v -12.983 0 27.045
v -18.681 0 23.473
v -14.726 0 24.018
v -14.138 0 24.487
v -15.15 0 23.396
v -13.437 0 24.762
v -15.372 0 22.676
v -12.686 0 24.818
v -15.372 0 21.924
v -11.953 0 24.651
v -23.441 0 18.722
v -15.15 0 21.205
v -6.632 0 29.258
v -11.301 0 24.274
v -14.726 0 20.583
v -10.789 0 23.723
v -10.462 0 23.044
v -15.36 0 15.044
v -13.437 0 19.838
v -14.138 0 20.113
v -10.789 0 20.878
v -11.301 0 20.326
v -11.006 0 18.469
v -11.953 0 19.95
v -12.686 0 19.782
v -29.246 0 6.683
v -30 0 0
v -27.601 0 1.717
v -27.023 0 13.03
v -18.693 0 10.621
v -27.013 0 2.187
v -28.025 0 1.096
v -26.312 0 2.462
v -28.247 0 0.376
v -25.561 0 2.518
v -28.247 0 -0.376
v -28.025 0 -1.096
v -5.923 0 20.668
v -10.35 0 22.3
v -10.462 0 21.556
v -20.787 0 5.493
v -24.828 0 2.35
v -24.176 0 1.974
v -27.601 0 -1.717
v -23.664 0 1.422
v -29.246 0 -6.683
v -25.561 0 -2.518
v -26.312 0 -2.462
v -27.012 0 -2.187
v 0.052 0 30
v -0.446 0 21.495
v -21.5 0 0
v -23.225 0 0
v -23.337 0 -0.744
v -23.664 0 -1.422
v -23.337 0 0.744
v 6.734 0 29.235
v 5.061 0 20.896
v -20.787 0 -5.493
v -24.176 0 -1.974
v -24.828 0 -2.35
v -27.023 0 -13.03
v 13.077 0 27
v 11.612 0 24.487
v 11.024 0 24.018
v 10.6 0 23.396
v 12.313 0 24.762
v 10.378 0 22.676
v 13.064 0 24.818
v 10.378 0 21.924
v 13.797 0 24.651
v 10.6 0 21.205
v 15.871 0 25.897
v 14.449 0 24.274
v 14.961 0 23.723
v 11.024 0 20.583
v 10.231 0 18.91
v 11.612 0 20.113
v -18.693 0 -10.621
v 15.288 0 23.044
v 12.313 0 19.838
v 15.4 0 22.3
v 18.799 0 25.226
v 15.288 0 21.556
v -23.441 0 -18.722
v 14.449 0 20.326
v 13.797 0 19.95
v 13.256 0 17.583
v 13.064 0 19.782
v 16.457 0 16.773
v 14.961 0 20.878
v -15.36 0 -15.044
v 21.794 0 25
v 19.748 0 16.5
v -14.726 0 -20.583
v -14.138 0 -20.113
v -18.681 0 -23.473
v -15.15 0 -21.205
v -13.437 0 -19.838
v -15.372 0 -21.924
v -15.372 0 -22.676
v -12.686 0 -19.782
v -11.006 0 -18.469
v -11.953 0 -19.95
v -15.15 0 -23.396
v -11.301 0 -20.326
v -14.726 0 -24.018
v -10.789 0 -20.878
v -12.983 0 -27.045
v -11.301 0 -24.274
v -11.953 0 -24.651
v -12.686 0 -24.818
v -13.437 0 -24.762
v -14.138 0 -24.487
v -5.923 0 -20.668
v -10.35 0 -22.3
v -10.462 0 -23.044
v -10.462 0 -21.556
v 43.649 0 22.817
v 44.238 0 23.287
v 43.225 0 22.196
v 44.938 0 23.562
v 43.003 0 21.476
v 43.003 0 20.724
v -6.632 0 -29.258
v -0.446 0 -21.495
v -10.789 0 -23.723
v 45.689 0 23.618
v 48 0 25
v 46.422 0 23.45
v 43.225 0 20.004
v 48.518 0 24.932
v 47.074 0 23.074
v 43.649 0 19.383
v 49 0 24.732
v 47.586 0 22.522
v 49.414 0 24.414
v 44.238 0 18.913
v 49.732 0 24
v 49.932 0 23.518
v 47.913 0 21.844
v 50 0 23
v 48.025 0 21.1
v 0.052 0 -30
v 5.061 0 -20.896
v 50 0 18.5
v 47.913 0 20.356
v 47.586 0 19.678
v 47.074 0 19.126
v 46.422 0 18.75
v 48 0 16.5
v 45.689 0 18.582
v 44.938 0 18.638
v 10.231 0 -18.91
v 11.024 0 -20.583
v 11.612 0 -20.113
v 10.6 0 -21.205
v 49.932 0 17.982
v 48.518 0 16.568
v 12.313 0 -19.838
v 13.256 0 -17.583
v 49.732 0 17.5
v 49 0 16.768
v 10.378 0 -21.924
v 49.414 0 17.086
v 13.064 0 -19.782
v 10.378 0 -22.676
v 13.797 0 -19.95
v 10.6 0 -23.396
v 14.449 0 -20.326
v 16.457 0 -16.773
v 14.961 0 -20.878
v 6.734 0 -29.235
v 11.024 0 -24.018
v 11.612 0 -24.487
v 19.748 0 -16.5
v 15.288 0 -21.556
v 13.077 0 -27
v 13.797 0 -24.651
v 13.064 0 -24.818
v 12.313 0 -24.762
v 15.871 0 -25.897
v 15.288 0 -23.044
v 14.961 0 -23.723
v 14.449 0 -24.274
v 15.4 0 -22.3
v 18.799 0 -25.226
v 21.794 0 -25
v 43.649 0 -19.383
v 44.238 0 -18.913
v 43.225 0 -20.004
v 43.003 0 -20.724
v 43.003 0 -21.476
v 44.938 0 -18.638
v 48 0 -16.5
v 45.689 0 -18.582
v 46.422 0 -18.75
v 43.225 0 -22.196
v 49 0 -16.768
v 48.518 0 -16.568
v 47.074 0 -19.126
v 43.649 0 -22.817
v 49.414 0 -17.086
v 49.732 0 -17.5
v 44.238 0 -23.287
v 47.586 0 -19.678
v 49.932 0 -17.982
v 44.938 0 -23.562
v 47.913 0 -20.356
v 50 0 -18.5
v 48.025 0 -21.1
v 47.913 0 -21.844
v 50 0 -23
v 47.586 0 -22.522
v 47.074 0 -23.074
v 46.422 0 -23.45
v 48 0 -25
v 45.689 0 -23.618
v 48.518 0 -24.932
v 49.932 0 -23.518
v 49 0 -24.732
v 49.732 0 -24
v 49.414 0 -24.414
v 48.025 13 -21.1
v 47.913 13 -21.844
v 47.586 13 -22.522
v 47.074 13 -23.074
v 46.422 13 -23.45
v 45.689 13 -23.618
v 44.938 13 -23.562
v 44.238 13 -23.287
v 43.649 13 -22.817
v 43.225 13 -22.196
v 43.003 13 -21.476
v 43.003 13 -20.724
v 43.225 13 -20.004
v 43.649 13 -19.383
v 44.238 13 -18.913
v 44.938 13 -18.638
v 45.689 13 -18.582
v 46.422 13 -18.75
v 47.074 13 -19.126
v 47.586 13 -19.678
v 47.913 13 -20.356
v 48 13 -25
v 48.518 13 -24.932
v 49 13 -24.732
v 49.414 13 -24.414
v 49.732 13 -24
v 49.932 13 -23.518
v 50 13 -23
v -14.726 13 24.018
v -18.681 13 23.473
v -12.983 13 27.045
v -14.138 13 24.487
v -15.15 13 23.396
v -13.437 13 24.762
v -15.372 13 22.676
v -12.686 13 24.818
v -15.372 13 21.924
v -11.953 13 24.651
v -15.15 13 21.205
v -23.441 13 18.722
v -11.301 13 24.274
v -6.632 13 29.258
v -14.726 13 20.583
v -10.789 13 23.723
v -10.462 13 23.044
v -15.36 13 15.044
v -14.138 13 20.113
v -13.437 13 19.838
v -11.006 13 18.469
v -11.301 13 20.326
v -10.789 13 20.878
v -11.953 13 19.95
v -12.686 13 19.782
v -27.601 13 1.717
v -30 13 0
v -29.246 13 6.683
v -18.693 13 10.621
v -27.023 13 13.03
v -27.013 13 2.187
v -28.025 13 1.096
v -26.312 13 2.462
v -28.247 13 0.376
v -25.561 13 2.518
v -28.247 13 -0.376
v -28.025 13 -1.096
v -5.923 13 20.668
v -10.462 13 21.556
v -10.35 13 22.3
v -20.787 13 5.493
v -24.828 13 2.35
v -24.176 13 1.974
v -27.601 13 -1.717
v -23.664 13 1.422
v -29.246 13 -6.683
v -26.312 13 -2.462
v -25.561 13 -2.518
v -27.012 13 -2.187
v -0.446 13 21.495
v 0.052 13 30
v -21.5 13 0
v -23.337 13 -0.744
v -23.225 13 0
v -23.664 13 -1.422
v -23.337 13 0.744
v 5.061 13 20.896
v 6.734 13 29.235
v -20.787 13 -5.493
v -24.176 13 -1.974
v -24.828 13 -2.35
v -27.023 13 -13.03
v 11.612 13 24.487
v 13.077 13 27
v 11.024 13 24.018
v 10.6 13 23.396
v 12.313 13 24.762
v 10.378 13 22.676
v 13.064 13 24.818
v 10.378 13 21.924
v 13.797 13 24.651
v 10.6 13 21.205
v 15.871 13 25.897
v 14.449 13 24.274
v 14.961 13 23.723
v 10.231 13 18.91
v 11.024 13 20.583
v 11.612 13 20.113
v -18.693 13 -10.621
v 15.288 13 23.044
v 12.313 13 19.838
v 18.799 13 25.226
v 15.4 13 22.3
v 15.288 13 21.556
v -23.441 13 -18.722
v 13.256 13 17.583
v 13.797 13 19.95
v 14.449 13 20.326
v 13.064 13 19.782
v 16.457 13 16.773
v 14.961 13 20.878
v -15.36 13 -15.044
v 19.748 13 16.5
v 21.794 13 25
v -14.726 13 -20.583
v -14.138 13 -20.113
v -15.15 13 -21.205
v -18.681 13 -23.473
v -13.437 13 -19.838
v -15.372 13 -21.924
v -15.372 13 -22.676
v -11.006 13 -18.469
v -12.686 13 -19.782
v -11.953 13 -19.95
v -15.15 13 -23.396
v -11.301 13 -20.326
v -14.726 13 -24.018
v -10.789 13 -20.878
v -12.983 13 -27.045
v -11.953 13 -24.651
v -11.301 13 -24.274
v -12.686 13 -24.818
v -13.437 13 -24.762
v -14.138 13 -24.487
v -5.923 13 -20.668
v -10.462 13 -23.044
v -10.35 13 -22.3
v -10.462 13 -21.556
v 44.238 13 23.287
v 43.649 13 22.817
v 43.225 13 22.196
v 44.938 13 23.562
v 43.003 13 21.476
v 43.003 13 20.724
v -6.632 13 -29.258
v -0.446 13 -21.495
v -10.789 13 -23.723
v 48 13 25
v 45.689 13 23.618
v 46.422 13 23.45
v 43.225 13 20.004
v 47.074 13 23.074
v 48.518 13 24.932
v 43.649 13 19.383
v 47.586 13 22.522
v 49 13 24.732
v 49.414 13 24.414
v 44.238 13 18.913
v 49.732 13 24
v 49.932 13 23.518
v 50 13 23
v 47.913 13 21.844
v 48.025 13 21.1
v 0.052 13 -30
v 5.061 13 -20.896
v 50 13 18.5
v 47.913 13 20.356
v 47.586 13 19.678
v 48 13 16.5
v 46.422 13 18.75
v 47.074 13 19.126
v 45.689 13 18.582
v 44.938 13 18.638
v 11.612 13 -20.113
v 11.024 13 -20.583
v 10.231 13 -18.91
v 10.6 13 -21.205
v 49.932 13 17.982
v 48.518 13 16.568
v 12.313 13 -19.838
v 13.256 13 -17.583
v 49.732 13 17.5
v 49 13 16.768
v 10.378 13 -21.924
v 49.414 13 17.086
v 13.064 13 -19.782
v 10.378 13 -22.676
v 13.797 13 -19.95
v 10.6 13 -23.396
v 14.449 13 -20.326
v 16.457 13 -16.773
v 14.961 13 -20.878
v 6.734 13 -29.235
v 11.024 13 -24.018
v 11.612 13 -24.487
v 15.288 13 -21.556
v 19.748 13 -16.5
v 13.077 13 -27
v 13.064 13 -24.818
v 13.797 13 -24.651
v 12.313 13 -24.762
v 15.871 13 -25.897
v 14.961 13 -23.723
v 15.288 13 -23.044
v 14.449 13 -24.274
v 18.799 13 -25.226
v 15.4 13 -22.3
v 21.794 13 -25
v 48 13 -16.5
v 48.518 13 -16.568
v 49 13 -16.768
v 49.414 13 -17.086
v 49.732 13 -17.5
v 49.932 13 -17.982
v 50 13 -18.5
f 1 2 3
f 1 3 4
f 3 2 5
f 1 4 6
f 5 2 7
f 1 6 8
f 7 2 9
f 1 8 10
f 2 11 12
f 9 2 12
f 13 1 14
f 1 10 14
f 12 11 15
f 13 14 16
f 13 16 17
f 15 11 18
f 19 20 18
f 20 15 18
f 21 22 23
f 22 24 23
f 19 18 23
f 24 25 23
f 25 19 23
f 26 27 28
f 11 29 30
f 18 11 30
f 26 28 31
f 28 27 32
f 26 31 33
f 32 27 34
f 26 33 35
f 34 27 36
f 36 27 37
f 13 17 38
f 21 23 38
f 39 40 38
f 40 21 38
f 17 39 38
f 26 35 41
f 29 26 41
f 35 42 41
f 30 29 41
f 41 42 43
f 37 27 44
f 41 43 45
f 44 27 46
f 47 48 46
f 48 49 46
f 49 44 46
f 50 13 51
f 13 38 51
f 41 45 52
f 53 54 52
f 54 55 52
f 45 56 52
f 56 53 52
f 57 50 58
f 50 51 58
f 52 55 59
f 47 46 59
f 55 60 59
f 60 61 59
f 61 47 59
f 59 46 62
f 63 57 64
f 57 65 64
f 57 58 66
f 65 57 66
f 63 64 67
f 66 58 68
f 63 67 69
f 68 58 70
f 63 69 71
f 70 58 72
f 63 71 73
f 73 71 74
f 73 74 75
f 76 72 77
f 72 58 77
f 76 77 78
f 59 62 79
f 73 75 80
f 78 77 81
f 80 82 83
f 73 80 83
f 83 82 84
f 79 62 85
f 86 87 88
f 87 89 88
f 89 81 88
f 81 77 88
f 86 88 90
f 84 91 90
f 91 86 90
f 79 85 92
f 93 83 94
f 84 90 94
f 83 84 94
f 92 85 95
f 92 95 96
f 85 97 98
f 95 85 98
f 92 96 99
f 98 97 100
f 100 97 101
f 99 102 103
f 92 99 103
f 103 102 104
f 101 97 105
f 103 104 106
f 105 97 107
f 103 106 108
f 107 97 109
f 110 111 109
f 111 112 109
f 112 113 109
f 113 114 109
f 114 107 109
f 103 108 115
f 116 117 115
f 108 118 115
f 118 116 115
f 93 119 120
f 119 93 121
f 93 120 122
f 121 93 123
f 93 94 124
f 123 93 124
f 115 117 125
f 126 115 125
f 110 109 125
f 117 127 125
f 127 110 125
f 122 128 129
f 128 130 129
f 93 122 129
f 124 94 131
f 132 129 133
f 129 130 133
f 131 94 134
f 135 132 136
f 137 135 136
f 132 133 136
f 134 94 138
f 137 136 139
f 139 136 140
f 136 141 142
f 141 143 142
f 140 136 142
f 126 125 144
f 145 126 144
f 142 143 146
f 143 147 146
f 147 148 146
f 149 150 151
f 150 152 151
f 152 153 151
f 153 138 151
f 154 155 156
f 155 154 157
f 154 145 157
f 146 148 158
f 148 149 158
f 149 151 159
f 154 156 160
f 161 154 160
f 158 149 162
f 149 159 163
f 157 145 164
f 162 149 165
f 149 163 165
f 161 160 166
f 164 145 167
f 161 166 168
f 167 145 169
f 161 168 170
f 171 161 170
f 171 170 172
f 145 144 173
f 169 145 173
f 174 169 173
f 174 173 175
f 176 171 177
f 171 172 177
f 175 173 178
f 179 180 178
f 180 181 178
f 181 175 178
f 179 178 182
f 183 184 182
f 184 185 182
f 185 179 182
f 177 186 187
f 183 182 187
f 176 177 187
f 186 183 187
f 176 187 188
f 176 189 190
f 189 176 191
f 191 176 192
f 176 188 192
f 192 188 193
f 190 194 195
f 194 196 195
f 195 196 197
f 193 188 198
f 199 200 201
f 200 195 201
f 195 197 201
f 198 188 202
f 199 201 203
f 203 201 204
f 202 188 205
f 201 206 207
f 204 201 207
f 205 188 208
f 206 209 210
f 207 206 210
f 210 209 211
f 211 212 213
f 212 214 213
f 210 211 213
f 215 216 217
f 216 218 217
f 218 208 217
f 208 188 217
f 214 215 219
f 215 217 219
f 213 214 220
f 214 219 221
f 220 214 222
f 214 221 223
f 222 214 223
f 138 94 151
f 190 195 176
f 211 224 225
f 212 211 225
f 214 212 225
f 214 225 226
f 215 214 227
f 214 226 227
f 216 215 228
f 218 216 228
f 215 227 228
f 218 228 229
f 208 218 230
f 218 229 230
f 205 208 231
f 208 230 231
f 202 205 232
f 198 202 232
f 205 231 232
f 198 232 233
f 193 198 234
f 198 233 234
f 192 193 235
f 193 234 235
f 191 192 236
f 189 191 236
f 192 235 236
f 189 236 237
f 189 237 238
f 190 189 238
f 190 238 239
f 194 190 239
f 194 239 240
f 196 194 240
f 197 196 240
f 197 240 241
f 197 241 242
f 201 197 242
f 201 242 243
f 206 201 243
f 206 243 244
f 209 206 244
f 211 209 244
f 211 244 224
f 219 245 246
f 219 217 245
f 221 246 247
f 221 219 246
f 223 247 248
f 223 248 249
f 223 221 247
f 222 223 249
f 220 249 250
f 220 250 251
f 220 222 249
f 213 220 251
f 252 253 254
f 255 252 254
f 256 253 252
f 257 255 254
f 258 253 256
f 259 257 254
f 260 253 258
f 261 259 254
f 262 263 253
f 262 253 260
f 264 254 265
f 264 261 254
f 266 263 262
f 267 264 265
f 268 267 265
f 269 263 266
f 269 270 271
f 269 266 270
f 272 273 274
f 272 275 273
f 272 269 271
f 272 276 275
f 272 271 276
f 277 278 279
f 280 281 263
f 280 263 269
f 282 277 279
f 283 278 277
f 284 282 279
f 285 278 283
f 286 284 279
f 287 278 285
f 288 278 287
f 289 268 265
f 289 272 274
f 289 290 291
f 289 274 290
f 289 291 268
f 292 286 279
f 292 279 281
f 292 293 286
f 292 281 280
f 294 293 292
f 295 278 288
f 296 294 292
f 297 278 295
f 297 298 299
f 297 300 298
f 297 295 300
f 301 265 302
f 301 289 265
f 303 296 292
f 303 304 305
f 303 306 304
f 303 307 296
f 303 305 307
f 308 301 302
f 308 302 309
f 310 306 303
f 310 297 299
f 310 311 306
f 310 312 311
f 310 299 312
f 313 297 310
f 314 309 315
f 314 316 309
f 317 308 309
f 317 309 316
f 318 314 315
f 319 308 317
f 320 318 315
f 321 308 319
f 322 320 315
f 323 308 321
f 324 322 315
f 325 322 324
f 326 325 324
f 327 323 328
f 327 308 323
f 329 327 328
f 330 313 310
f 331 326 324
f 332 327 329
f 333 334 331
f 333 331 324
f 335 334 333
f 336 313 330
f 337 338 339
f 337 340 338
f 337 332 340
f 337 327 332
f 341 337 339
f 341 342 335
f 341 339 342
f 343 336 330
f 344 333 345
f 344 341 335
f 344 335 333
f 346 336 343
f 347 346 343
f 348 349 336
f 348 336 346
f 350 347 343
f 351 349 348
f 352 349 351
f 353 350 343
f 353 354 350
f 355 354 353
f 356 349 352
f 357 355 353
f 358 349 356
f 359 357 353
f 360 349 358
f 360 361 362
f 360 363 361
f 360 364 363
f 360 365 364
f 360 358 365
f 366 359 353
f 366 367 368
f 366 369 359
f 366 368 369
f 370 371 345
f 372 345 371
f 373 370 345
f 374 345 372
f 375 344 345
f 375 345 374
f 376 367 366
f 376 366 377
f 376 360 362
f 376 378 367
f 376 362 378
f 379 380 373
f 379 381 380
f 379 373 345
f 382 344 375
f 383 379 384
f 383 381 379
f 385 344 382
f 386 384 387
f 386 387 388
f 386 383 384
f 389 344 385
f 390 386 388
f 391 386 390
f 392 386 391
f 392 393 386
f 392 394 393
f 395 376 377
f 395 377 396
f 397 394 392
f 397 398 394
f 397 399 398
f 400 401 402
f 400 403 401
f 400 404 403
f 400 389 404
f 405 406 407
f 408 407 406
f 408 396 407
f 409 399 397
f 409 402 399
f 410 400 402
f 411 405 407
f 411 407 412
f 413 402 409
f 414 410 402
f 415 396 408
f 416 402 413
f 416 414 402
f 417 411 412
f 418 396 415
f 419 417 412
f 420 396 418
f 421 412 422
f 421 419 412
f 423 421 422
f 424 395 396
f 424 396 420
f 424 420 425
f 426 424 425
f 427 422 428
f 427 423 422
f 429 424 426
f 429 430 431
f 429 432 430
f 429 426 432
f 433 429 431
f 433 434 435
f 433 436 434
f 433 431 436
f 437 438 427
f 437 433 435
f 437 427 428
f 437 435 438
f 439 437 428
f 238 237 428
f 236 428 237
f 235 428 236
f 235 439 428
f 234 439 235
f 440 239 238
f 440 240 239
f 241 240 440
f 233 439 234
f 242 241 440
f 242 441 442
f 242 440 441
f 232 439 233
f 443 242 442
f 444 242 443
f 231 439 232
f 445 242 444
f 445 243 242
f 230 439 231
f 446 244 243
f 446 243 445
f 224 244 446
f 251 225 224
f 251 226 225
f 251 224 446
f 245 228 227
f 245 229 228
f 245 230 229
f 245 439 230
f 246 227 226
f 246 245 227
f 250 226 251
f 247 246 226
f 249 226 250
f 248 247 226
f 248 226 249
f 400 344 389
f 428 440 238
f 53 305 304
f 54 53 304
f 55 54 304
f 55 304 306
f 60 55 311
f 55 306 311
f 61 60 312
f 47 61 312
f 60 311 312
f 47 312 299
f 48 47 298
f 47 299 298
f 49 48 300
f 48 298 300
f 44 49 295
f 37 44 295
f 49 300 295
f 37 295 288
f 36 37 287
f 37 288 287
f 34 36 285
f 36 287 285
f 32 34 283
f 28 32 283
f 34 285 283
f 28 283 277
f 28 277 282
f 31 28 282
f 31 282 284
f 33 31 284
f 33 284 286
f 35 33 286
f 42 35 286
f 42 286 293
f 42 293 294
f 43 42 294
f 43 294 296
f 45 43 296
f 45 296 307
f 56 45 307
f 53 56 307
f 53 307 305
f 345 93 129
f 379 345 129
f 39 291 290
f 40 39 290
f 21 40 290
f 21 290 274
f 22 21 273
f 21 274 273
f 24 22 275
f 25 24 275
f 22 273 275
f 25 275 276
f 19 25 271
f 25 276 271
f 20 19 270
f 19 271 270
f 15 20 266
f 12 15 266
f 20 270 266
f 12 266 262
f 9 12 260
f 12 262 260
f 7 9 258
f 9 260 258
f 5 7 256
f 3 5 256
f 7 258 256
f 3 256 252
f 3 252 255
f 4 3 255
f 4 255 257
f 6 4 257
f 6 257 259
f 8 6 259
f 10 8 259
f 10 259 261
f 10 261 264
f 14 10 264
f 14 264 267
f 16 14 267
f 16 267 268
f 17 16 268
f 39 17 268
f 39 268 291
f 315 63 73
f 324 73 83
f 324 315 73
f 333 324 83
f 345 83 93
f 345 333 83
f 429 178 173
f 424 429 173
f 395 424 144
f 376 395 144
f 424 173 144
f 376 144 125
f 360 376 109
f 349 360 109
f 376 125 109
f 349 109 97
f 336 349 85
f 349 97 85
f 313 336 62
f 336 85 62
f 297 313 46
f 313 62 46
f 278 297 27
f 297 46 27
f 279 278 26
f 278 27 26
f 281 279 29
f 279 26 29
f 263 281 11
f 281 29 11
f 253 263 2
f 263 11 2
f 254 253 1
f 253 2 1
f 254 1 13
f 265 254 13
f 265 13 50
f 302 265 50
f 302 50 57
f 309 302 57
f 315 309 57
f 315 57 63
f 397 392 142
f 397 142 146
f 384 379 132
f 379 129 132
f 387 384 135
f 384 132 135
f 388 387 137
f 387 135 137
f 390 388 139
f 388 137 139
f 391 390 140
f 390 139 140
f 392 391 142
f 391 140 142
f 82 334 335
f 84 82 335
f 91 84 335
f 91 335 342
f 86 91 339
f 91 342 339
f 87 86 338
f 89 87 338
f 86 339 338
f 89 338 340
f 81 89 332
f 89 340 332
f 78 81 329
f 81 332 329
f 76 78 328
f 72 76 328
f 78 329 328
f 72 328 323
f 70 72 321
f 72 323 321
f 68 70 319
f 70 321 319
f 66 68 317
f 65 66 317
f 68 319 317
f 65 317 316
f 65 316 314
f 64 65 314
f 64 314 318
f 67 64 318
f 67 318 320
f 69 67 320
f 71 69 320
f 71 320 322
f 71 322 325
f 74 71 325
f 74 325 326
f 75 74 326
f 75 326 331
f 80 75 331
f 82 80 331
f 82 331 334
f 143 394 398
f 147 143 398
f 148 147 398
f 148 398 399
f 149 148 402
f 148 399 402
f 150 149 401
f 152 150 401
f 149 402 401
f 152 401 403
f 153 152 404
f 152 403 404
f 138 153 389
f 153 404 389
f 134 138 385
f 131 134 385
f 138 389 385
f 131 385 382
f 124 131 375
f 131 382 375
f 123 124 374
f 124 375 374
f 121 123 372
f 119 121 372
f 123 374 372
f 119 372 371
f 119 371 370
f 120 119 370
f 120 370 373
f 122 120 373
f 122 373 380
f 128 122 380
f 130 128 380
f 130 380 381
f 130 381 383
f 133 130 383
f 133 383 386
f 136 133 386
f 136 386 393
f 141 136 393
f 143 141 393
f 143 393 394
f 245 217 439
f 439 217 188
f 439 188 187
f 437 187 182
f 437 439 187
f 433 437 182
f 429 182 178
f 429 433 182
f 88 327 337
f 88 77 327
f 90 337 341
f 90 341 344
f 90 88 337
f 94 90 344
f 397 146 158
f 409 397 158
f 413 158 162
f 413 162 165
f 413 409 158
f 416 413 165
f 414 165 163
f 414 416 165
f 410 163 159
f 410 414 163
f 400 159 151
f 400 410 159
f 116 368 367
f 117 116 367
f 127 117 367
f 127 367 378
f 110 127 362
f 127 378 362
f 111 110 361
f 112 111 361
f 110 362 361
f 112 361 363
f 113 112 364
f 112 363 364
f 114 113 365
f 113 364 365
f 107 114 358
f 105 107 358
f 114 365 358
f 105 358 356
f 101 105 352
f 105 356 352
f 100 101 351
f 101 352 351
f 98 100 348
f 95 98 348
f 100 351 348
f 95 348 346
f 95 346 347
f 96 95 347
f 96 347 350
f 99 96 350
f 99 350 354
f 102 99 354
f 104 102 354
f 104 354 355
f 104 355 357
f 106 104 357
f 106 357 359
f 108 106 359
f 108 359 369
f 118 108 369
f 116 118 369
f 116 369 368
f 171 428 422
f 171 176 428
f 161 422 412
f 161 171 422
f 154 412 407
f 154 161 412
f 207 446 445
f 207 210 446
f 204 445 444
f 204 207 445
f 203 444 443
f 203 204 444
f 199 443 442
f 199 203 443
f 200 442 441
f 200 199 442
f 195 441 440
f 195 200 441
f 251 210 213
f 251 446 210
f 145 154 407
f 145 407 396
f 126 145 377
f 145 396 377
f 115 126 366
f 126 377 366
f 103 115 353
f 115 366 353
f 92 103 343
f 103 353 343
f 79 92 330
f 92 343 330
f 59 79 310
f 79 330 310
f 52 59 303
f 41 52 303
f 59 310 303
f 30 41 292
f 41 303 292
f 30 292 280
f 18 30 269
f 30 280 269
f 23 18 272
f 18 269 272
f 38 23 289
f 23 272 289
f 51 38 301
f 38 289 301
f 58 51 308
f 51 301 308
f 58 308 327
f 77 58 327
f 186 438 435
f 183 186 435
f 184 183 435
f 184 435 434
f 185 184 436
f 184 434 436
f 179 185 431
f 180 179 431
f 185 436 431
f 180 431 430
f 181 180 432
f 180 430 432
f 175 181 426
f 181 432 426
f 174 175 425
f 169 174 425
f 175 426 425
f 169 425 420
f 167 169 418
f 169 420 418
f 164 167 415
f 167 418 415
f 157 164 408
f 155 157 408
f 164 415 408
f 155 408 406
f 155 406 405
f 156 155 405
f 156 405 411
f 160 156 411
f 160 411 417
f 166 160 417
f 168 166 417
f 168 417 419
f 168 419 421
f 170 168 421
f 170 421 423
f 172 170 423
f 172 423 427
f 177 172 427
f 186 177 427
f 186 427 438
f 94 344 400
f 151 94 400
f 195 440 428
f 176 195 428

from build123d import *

# Parameters (mm, degrees)
EXTRUDE_1_DEPTH     = 13
SKETCH_2_R          = 2.525
CUT_EXTRUDE_1_DEPTH = 14
CUT_EXTRUDE_2_DEPTH = 14
SKETCH_4_R          = 2.525
CUT_EXTRUDE_3_DEPTH = 14
SKETCH_5_W          = 8
SKETCH_5_H          = 50
CUT_EXTRUDE_4_DEPTH = 14
SKETCH_6_R          = 1.525
CUT_EXTRUDE_5_DEPTH = 14
SKETCH_7_W          = 12
SKETCH_7_H          = 55
CUT_EXTRUDE_6_DEPTH = 14
FILLET_1_R          = 20
FILLET_2_R          = 20
FILLET_3_R          = 2


with BuildPart() as part:
    # 草图1 → 凸台-拉伸1 (new body)
    with BuildSketch(Plane(origin=(0, 0, 0), x_dir=(1, 0, 0), z_dir=(0, 1, 0))):
        with BuildLine():
            ThreePointArc((16.583123952, 25), (-30, 0), (16.583123952, -25))
            Line((16.583123952, -25), (16.583123952, 25))
        make_face()
        with BuildLine():
            Line((16.583123952, 25), (16.583123952, -25))
            ThreePointArc((16.583123952, -25), (26.433820369, -14.186371655), (30, 0))
            ThreePointArc((30, 0), (26.433820369, 14.186371655), (16.583123952, 25))
        make_face()
        with BuildLine():
            ThreePointArc((30, 0), (26.433820369, -14.186371655), (16.583123952, -25))
            Line((16.583123952, -25), (70, -25))
            Line((70, -25), (70, 25))
            Line((70, 25), (16.583123952, 25))
            ThreePointArc((16.583123952, 25), (26.433820369, 14.186371655), (30, 0))
        make_face()
    extrude(amount=EXTRUDE_1_DEPTH)

    # 草图2 → 切除-拉伸1 (cut, through all)
    with BuildSketch(Plane(origin=(0, 13, 0), x_dir=(1, 0, 0), z_dir=(0, 1, 0))):
        with Locations((-25.75, 0)):
            Circle(SKETCH_2_R)
        with Locations((-12.875, 22.300154147)):
            Circle(SKETCH_2_R)
        with Locations((12.875, 22.300154147)):
            Circle(SKETCH_2_R)
        with Locations((25.75, 0)):
            Circle(SKETCH_2_R)
        with Locations((12.875, -22.300154147)):
            Circle(SKETCH_2_R)
        with Locations((-12.875, -22.300154147)):
            Circle(SKETCH_2_R)
    extrude(amount=-CUT_EXTRUDE_1_DEPTH, mode=Mode.SUBTRACT)

    # 草图3 → 切除-拉伸2 (cut, through all)
    with BuildSketch(Plane(origin=(0, 13, 0), x_dir=(1, 0, 0), z_dir=(0, 1, 0))):
        with BuildLine():
            Line((13.784048752, -16.5), (52, -16.5))
            Line((52, -16.5), (52, 16.5))
            Line((52, 16.5), (13.784048752, 16.5))
            ThreePointArc((13.784048752, 16.5), (-21.5, 0), (13.784048752, -16.5))
        make_face()
    extrude(amount=-CUT_EXTRUDE_2_DEPTH, mode=Mode.SUBTRACT)

    # 草图4 → 切除-拉伸3 (cut, through all)
    with BuildSketch(Plane(origin=(0, 13, 0), x_dir=(1, 0, 0), z_dir=(0, 1, 0))):
        with Locations((45.5, 21.1)):
            Circle(SKETCH_4_R)
        with Locations((45.5, -21.1)):
            Circle(SKETCH_4_R)
    extrude(amount=-CUT_EXTRUDE_3_DEPTH, mode=Mode.SUBTRACT)

    # 草图5 → 切除-拉伸4 (cut, through all)
    with BuildSketch(Plane(origin=(0, 13, 0), x_dir=(1, 0, 0), z_dir=(0, 1, 0))):
        with Locations((66, 0)):
            Rectangle(SKETCH_5_W, SKETCH_5_H)
    extrude(amount=-CUT_EXTRUDE_4_DEPTH, mode=Mode.SUBTRACT)

    # 草图6 → 切除-拉伸5 (cut, through all)
    with BuildSketch(Plane(origin=(0, 13, 0), x_dir=(1, 0, 0), z_dir=(0, 1, 0))):
        with Locations((56, 0)):
            Circle(SKETCH_6_R)
        with Locations((56, 15)):
            Circle(SKETCH_6_R)
        with Locations((56, -15)):
            Circle(SKETCH_6_R)
    extrude(amount=-CUT_EXTRUDE_5_DEPTH, mode=Mode.SUBTRACT)

    # 草图7 → 切除-拉伸6 (cut, through all)
    with BuildSketch(Plane(origin=(0, 13, 0), x_dir=(1, 0, 0), z_dir=(0, 1, 0))):
        with Locations((56, -2.5)):
            Rectangle(SKETCH_7_W, SKETCH_7_H)
    extrude(amount=-CUT_EXTRUDE_6_DEPTH, mode=Mode.SUBTRACT)

    # 圆角1
    fillet_1_edges = [part.edges().sort_by_distance(p)[0] for p in [
        (13.784048752, 6.5, -16.5),
        (13.784048752, 6.5, 16.5),
    ]]
    fillet(fillet_1_edges, radius=FILLET_1_R)

    # 圆角2
    fillet_2_edges = [part.edges().sort_by_distance(p)[0] for p in [
        (16.583123952, 6.5, -25),
        (16.583123952, 6.5, 25),
    ]]
    fillet(fillet_2_edges, radius=FILLET_2_R)

    # 圆角3
    fillet_3_edges = [part.edges().sort_by_distance(p)[0] for p in [
        (50, 6.5, 16.5),
        (50, 6.5, 25),
        (50, 6.5, -16.5),
        (50, 6.5, -25),
    ]]
    fillet(fillet_3_edges, radius=FILLET_3_R)


solid = part.part
